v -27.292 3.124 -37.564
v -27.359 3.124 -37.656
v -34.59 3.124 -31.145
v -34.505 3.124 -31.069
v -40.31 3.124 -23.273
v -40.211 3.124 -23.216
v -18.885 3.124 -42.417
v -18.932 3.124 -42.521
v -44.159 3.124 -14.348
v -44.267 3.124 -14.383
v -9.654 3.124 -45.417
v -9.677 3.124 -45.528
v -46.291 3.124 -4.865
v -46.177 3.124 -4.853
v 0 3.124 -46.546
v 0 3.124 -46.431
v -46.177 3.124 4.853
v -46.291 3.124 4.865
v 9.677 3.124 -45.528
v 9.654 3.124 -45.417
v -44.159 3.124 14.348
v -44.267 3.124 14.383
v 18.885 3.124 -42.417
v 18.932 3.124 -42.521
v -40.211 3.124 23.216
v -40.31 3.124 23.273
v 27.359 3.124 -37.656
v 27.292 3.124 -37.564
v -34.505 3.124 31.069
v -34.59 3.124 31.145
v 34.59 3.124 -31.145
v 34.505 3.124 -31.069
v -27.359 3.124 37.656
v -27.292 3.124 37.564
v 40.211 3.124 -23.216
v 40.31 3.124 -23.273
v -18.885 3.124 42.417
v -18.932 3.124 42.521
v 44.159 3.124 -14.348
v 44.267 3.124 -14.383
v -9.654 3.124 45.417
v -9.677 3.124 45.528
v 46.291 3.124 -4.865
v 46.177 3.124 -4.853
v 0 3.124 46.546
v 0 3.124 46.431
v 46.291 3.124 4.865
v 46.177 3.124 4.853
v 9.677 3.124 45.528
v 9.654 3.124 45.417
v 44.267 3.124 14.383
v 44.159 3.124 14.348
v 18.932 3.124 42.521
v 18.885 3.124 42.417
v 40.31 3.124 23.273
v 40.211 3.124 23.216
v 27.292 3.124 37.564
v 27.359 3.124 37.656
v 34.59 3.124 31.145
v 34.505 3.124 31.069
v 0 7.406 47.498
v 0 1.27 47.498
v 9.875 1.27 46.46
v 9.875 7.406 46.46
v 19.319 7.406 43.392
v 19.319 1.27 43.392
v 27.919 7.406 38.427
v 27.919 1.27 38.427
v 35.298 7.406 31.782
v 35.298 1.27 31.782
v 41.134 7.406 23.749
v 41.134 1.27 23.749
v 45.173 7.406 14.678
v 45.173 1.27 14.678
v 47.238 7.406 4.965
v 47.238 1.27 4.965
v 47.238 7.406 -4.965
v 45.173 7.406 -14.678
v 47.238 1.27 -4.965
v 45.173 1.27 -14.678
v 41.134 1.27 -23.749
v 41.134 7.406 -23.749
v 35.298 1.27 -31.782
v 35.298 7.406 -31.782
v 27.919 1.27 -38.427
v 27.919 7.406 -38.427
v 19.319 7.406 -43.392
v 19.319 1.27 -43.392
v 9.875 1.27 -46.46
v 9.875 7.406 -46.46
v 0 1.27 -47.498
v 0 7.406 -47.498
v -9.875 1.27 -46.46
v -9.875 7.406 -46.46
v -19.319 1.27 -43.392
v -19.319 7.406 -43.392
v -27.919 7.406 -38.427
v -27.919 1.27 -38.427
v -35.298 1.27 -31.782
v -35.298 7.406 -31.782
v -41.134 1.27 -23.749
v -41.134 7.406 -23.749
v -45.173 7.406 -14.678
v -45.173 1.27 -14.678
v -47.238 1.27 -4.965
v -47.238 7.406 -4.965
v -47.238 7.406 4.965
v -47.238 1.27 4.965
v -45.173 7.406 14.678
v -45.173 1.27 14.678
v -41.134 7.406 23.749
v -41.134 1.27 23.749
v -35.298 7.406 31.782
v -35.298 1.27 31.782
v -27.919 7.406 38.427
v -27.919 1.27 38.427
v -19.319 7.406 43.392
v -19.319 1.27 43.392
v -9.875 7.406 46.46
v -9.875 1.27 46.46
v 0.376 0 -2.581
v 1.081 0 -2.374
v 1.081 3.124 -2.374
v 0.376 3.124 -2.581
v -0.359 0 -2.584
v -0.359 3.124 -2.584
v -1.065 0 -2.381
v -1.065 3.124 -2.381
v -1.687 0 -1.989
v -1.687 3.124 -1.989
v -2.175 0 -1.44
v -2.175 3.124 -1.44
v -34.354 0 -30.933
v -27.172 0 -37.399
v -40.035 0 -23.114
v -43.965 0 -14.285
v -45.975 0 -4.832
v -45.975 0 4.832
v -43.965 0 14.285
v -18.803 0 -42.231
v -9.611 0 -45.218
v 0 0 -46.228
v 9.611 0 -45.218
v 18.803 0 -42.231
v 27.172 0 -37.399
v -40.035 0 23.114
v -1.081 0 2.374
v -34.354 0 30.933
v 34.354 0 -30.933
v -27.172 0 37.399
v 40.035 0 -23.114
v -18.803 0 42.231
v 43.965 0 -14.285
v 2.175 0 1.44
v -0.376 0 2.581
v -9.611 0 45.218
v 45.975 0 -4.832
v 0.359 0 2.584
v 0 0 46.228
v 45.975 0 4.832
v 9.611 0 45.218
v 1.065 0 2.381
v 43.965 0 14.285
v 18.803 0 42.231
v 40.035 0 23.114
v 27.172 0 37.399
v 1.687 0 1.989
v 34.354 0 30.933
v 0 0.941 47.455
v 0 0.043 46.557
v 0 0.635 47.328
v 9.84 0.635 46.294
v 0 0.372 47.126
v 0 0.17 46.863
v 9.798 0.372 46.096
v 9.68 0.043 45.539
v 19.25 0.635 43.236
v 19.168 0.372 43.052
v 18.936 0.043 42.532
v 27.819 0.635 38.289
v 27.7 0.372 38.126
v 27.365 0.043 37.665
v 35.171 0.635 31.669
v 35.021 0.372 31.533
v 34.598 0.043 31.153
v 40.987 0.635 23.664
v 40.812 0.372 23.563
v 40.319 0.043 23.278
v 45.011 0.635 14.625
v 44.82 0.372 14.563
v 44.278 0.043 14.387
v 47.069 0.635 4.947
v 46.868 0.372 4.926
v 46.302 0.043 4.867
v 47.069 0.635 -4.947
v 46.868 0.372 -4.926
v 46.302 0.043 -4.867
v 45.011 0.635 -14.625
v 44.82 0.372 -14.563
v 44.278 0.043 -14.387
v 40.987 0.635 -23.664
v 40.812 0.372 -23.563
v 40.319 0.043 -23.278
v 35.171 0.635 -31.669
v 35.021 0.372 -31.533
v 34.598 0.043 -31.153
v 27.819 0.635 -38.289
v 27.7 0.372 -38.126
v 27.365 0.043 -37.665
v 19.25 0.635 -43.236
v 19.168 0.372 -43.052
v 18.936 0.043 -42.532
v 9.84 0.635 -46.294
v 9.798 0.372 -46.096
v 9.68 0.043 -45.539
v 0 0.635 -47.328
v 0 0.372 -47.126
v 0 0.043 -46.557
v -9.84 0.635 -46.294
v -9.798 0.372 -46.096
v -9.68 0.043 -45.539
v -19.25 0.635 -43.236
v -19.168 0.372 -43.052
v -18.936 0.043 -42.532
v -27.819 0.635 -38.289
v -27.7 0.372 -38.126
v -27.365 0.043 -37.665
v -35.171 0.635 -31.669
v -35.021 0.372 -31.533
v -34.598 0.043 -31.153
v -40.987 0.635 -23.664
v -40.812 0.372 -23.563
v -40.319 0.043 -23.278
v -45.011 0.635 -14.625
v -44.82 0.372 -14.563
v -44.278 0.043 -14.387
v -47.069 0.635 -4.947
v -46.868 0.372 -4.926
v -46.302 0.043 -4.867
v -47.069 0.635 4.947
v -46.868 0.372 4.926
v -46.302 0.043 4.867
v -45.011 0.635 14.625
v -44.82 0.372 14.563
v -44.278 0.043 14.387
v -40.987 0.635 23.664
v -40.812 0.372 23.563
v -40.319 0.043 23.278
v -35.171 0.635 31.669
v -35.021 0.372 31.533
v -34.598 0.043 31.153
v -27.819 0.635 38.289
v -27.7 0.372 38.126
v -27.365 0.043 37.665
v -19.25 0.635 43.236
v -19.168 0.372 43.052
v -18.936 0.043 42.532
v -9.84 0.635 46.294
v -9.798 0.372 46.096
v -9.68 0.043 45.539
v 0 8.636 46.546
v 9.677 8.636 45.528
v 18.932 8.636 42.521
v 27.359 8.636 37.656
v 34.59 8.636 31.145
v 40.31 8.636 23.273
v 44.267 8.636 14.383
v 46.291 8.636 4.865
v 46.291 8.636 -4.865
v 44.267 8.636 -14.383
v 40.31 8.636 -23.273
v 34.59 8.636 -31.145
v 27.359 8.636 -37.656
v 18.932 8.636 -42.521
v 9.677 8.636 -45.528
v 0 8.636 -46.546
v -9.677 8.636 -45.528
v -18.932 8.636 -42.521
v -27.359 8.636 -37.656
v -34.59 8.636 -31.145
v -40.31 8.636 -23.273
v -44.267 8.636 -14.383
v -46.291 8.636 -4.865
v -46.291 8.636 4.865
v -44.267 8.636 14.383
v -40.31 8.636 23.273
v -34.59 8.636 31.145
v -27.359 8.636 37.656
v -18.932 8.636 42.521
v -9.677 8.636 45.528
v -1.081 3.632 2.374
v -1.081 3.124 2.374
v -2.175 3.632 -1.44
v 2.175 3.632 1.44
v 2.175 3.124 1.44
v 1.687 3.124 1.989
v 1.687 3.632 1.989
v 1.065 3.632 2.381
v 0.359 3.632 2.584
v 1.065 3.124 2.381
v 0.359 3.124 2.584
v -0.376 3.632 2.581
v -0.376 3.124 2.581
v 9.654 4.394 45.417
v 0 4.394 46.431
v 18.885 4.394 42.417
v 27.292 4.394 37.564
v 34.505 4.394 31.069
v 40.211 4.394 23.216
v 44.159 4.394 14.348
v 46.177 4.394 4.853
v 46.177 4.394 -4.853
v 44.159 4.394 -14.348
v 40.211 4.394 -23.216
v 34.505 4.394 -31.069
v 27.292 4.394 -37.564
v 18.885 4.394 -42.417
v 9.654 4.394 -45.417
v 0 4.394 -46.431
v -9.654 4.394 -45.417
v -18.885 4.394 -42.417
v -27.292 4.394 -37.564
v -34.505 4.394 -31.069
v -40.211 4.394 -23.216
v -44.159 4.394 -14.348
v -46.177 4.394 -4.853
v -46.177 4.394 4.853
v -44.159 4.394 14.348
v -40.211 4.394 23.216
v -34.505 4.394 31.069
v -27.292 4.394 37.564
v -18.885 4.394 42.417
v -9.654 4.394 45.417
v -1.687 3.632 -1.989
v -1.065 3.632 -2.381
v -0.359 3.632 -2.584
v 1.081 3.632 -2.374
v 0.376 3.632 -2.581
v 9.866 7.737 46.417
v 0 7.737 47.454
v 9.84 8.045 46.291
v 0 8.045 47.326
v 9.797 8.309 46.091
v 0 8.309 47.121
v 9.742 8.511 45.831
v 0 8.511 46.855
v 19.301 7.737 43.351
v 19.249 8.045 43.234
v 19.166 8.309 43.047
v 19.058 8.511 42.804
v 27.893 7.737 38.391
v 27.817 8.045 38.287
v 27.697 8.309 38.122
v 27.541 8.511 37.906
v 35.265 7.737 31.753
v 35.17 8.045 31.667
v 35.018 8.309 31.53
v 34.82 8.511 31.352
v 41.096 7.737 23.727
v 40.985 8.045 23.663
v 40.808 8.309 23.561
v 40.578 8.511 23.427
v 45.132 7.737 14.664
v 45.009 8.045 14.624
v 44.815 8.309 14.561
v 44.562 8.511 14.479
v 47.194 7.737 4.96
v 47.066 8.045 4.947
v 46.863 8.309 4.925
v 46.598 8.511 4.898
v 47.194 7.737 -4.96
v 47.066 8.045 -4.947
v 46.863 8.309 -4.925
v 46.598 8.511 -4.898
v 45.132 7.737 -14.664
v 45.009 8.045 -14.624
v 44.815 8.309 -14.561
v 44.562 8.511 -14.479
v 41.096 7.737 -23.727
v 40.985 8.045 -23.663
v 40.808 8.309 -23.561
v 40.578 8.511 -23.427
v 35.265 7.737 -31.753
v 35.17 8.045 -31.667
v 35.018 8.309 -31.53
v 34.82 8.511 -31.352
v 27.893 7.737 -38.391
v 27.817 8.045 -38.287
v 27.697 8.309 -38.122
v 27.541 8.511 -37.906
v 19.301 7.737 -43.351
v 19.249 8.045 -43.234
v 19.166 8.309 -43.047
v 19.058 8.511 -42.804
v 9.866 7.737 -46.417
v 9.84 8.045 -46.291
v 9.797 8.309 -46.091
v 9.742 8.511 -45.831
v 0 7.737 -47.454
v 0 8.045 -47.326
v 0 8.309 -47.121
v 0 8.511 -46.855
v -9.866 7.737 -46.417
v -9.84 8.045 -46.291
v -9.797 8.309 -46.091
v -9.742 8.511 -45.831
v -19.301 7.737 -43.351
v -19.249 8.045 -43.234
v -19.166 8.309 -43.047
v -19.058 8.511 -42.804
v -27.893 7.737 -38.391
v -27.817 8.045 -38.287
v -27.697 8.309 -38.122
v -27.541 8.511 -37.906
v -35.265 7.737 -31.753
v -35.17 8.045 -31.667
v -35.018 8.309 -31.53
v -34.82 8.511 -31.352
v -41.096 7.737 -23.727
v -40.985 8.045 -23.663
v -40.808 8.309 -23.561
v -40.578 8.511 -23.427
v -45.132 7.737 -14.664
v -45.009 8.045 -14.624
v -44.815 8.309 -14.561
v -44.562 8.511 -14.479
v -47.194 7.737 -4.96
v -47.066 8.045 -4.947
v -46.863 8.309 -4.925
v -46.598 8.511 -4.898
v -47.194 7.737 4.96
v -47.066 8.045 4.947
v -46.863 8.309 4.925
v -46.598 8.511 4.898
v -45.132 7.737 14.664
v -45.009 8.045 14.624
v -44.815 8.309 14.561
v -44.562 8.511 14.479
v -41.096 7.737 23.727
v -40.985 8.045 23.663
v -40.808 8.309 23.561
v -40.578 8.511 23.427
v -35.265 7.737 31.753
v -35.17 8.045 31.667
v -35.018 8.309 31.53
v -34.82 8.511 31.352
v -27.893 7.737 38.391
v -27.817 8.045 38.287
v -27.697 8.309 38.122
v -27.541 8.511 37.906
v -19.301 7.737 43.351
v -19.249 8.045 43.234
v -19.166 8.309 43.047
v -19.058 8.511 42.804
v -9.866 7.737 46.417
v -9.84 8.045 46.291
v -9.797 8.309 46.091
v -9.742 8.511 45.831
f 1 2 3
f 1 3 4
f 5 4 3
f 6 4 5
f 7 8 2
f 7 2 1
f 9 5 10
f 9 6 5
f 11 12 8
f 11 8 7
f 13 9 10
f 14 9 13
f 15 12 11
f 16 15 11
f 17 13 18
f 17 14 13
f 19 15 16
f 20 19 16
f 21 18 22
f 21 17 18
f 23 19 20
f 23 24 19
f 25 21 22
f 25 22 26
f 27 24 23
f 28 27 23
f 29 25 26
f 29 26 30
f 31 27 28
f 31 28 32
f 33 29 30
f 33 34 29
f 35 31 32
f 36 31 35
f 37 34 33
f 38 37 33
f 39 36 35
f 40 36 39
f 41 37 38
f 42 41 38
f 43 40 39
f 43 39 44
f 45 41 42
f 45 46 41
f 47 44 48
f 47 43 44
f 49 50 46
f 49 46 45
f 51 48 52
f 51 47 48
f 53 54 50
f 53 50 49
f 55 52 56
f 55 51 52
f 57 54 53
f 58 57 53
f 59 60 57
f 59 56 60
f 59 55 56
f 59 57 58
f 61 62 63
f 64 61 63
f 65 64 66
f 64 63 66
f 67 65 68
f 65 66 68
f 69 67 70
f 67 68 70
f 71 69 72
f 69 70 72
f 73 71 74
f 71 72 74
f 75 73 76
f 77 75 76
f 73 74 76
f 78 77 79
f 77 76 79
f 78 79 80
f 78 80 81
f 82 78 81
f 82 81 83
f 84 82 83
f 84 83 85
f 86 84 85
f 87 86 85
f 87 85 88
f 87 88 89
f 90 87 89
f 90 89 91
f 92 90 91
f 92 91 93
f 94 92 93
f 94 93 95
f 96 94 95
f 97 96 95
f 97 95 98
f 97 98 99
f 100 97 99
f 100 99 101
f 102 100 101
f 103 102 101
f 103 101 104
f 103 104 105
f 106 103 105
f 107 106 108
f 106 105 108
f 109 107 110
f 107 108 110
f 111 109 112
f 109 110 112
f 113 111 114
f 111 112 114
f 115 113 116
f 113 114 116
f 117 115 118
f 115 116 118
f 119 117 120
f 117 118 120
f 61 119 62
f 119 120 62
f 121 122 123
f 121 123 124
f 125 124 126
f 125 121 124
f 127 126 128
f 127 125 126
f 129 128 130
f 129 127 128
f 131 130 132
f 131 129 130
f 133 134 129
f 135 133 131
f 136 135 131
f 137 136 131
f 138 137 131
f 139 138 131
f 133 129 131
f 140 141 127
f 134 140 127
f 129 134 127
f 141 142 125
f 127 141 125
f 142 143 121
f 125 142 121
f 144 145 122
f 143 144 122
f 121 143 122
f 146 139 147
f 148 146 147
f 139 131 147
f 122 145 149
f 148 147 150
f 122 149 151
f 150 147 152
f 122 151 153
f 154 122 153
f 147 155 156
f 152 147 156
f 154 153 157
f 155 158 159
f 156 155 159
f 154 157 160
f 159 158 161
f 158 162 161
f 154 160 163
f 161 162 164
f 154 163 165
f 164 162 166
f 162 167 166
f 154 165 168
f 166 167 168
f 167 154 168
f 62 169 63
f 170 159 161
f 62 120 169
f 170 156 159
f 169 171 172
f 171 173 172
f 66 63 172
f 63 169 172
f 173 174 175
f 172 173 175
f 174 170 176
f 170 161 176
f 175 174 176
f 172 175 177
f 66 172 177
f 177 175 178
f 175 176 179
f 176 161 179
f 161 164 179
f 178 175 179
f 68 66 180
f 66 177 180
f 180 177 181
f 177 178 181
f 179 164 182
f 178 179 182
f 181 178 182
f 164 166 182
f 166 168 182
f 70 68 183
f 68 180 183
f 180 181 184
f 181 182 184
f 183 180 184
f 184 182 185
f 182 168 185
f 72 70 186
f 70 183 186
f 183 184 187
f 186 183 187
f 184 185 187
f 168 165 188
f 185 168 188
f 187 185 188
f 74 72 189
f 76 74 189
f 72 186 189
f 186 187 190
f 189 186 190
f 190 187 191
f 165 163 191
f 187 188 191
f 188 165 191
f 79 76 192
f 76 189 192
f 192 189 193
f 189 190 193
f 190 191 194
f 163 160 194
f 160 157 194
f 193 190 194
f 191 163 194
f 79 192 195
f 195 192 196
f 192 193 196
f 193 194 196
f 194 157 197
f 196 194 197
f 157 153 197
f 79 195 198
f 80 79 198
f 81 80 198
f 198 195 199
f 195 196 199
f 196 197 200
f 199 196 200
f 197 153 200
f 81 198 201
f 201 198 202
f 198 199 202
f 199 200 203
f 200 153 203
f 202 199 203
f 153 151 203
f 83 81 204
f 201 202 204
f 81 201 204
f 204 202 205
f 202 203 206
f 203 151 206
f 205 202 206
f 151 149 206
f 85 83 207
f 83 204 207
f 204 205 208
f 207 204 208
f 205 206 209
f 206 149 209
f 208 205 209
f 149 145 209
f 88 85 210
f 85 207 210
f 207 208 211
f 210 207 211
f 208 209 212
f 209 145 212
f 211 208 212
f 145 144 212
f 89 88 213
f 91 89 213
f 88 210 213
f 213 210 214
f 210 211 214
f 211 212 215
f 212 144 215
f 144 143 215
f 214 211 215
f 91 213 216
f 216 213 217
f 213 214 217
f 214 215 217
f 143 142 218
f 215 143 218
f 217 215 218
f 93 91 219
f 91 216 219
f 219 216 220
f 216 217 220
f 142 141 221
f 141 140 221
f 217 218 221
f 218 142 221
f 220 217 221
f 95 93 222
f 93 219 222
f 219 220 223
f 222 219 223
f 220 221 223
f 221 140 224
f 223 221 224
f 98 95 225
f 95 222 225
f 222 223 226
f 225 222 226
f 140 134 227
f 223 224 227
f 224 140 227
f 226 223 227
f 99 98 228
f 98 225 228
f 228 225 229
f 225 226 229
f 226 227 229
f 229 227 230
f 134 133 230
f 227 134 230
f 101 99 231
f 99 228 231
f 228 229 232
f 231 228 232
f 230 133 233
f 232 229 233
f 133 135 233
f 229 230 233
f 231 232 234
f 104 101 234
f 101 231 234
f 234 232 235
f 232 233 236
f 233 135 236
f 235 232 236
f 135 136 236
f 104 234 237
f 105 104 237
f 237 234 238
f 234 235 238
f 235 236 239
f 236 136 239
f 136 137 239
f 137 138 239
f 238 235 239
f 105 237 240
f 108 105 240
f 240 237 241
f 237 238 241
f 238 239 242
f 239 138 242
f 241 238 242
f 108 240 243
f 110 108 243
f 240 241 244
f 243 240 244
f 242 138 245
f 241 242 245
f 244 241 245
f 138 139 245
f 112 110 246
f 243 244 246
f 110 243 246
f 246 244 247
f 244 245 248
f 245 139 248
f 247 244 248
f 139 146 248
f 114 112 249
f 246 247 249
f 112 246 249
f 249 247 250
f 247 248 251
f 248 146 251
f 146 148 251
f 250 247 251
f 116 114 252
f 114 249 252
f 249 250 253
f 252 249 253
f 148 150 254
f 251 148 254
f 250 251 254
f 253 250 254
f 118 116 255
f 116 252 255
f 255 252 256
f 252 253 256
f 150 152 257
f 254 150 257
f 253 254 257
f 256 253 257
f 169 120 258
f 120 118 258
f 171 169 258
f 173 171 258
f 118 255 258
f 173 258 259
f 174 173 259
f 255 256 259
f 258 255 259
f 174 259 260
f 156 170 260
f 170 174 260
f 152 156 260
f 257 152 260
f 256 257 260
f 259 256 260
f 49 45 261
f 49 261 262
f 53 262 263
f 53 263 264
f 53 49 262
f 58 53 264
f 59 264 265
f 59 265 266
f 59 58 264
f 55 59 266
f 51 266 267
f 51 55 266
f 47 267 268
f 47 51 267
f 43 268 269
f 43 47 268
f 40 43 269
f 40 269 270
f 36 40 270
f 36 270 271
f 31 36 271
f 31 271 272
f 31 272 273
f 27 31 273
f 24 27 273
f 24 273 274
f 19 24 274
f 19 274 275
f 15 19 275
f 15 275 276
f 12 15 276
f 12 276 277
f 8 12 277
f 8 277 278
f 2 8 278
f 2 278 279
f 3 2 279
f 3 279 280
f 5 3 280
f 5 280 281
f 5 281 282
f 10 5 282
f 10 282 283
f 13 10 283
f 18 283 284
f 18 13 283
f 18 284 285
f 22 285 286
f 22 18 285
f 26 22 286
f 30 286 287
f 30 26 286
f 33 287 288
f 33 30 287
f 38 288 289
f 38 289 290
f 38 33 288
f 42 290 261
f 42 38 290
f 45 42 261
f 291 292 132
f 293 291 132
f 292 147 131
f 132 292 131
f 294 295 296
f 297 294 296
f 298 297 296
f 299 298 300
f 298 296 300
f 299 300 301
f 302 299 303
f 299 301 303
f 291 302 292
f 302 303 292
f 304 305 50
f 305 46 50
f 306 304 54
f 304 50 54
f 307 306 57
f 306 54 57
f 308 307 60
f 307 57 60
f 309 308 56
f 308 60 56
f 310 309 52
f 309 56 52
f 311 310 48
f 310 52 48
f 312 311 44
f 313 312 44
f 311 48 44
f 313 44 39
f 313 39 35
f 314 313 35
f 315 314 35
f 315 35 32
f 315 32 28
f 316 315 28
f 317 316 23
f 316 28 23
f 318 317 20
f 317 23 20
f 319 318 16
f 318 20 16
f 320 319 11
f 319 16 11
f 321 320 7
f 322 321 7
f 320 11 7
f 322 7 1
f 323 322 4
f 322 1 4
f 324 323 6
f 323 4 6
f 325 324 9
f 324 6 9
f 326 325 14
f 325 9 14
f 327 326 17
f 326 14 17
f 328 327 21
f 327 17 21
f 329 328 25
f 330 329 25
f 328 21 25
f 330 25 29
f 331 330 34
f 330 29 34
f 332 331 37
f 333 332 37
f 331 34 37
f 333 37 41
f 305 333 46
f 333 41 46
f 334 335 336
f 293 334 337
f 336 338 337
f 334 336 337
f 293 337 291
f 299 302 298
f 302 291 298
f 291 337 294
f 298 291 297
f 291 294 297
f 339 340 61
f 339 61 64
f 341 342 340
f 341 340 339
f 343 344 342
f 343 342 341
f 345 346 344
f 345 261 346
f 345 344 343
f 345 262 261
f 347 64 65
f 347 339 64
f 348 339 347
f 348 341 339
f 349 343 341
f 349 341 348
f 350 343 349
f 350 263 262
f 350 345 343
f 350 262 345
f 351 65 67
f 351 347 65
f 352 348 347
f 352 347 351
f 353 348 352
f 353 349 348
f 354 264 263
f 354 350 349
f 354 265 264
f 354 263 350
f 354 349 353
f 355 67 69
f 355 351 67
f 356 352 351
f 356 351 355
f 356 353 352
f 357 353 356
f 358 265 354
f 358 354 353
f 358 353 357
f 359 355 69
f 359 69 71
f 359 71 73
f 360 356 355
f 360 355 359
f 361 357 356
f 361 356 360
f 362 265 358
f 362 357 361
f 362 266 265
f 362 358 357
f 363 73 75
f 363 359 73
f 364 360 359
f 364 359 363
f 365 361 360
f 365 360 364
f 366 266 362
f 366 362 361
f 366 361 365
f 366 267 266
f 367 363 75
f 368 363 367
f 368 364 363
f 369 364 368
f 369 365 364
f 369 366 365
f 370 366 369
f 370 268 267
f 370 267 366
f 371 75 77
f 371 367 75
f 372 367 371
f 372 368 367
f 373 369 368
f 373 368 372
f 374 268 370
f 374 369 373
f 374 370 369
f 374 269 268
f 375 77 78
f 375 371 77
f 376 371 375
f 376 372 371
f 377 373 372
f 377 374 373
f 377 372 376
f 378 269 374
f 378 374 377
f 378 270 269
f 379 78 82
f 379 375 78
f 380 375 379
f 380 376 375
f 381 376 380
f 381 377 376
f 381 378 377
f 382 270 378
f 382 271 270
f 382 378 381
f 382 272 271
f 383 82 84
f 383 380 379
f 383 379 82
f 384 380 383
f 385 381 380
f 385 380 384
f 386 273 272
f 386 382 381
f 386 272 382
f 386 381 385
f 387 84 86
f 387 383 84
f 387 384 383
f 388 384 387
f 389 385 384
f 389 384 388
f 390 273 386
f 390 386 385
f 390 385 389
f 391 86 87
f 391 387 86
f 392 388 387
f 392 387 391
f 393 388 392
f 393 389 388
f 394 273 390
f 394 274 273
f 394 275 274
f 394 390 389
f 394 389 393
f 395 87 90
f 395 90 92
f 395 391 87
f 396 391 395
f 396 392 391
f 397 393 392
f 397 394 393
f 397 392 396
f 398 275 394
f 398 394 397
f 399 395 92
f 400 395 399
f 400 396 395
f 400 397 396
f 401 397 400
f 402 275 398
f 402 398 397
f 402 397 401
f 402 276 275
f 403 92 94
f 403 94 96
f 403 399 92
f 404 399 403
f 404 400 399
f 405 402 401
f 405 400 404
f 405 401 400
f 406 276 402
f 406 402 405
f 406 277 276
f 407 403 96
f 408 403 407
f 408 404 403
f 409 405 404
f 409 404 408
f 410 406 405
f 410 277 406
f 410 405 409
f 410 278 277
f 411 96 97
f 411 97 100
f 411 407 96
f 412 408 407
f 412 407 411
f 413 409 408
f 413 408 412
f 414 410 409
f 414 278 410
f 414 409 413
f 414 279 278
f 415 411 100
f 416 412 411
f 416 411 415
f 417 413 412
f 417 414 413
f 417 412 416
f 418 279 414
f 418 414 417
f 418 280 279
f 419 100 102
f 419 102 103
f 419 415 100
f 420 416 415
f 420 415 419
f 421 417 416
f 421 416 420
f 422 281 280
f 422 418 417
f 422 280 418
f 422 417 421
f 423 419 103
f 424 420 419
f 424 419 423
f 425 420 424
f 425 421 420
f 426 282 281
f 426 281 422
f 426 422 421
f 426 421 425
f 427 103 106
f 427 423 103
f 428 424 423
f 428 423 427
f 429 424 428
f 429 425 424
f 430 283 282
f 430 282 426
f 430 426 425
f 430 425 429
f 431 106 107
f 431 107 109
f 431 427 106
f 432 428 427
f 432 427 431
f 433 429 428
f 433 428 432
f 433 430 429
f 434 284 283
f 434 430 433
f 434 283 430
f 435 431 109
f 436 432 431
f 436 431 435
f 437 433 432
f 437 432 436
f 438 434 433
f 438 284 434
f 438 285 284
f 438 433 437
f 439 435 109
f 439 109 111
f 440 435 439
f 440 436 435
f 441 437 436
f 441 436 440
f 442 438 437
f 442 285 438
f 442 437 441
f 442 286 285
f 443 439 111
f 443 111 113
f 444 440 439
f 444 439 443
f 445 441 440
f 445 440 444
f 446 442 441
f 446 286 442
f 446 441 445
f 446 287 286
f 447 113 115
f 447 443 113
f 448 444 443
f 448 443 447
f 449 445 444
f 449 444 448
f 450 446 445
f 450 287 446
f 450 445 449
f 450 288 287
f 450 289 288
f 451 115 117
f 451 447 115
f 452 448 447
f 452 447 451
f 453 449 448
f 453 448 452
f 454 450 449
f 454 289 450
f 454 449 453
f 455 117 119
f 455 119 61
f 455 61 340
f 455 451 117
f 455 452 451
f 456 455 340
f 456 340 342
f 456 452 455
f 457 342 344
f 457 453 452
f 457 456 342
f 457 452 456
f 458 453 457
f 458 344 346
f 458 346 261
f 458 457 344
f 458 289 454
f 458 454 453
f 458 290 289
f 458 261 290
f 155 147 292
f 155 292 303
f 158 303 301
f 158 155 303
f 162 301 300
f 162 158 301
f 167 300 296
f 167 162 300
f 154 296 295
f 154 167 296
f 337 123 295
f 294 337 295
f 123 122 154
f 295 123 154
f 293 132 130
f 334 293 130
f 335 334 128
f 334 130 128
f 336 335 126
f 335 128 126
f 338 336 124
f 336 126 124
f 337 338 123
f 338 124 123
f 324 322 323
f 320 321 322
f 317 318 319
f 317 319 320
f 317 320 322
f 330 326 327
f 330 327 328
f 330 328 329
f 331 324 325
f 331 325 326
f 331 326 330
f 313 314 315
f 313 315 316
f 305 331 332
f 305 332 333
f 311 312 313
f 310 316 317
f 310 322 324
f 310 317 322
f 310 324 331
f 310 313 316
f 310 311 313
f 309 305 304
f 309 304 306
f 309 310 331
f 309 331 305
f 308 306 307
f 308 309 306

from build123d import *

# Parameters (mm, degrees)
SKETCH1_R           = 46.5455
SKETCH1_R_2         = 2.60858
BOSS_EXTRUDE1_DEPTH = 3.1242
SKETCH1_5_R         = 47.498
SKETCH1_5_R_2       = 46.5455
BOSS_EXTRUDE2_DEPTH = 8.636
FILLET1_R           = 1.27
FILLET2_R           = 1.27
SKETCH2_R           = 46.4312
BOSS_EXTRUDE3_DEPTH = 0.508
SKETCH3_R           = 46.4312
BOSS_EXTRUDE4_DEPTH = 0.762


with BuildPart() as part:
    # Sketch1 → Boss-Extrude1 (new body)
    # profile 1 of 3: a face of its own
    with BuildSketch(Plane(origin=(0, 0, 0), x_dir=(1, 0, 0), z_dir=(0, 1, 0))):
        with Locations(Location((0, 0, 0), (0, 0, 270))):
            Circle(SKETCH1_R)
        Circle(SKETCH1_R_2, mode=Mode.SUBTRACT)
    # profile 2 of 3: a face of its own
    with BuildSketch(Plane(origin=(0, 0, 0), x_dir=(1, 0, 0), z_dir=(0, 1, 0))):
        with BuildLine():
            ThreePointArc((2.60858, 0), (2.193727268, 1.411470966), (1.081120394, 2.37399838))
            Line((1.081120394, 2.37399838), (2.175329976, -1.439662846))
            ThreePointArc((2.175329976, -1.439662846), (2.497920324, -0.751720475), (2.60858, 0))
        make_face()
    # profile 3 of 3: a face of its own
    with BuildSketch(Plane(origin=(0, 0, 0), x_dir=(1, 0, 0), z_dir=(0, 1, 0))):
        with BuildLine():
            Line((-1.081120394, -2.37399838), (-2.175329976, 1.439662846))
            ThreePointArc((-2.175329976, 1.439662846), (-2.507413058, -0.719422946), (-1.081120394, -2.37399838))
        make_face()
    extrude(amount=BOSS_EXTRUDE1_DEPTH)

    # Sketch1<5> → Boss-Extrude2 (add)
    with BuildSketch(Plane(origin=(0, 0, 0), x_dir=(1, 0, 0), z_dir=(0, 1, 0))):
        with Locations(Location((0, 0, 0), (0, 0, 270))):
            Circle(SKETCH1_5_R)
        with Locations(Location((0, 0, 0), (0, 0, 270))):
            Circle(SKETCH1_5_R_2, mode=Mode.SUBTRACT)
    extrude(amount=BOSS_EXTRUDE2_DEPTH)

    # Fillet1
    fillet1_edges = [part.edges().sort_by_distance(p)[0] for p in [
        (0, 0, -47.498),
    ]]
    fillet(fillet1_edges, radius=FILLET1_R)

    # Fillet2
    # the kernel refuses this fillet: 1.27 mm, written as the material it takes off along each edge
    with BuildSketch(Plane(origin=(0, 8.636, 0), x_dir=(0, 0, 1), z_dir=(-1, 0, 0))) as fillet2_piece_1:
        with BuildLine():
            CenterArc((46.228, -1.229672212), FILLET2_R, 0, 75.522487814)
            Line((46.5455, 0), (46.55185, 0.024593444))
            ThreePointArc((46.55185, 0.024593444), (47.02175, 0.0254), (47.498, 0.0254))
            Line((47.498, 0.0254), (47.5234, 0))
            Line((47.5234, 0), (47.5234, -1.229672212))
            Line((47.5234, -1.229672212), (47.498, -1.229672212))
        make_face()
    revolve(axis=Axis((0, 8.636, 0), (0, 1, 0)), mode=Mode.SUBTRACT)

    # Sketch2 → Boss-Extrude3 (add)
    with BuildSketch(Plane(origin=(0, 3.1242, 0), x_dir=(1, 0, 0), z_dir=(0, 1, 0))):
        with Locations(Location((0, 0, 0), (0, 0, 270))):
            Circle(SKETCH2_R)
        with BuildLine():
            Line((-1.081120394, -2.37399838), (-2.175329976, 1.439662846))
            ThreePointArc((-2.175329976, 1.439662846), (-0.719422946, 2.507413058), (1.081120394, 2.37399838))
            Line((1.081120394, 2.37399838), (2.175329976, -1.439662846))
            ThreePointArc((2.175329976, -1.439662846), (0.719422946, -2.507413058), (-1.081120394, -2.37399838))
        make_face(mode=Mode.SUBTRACT)
    extrude(amount=BOSS_EXTRUDE3_DEPTH)

    # Sketch3 → Boss-Extrude4 (add)
    with BuildSketch(Plane(origin=(0, 3.6322, 0), x_dir=(1, 0, 0), z_dir=(0, 1, 0))):
        with Locations(Location((0, 0, 0), (0, 0, 270))):
            Circle(SKETCH3_R)
    extrude(amount=BOSS_EXTRUDE4_DEPTH)


solid = part.part
